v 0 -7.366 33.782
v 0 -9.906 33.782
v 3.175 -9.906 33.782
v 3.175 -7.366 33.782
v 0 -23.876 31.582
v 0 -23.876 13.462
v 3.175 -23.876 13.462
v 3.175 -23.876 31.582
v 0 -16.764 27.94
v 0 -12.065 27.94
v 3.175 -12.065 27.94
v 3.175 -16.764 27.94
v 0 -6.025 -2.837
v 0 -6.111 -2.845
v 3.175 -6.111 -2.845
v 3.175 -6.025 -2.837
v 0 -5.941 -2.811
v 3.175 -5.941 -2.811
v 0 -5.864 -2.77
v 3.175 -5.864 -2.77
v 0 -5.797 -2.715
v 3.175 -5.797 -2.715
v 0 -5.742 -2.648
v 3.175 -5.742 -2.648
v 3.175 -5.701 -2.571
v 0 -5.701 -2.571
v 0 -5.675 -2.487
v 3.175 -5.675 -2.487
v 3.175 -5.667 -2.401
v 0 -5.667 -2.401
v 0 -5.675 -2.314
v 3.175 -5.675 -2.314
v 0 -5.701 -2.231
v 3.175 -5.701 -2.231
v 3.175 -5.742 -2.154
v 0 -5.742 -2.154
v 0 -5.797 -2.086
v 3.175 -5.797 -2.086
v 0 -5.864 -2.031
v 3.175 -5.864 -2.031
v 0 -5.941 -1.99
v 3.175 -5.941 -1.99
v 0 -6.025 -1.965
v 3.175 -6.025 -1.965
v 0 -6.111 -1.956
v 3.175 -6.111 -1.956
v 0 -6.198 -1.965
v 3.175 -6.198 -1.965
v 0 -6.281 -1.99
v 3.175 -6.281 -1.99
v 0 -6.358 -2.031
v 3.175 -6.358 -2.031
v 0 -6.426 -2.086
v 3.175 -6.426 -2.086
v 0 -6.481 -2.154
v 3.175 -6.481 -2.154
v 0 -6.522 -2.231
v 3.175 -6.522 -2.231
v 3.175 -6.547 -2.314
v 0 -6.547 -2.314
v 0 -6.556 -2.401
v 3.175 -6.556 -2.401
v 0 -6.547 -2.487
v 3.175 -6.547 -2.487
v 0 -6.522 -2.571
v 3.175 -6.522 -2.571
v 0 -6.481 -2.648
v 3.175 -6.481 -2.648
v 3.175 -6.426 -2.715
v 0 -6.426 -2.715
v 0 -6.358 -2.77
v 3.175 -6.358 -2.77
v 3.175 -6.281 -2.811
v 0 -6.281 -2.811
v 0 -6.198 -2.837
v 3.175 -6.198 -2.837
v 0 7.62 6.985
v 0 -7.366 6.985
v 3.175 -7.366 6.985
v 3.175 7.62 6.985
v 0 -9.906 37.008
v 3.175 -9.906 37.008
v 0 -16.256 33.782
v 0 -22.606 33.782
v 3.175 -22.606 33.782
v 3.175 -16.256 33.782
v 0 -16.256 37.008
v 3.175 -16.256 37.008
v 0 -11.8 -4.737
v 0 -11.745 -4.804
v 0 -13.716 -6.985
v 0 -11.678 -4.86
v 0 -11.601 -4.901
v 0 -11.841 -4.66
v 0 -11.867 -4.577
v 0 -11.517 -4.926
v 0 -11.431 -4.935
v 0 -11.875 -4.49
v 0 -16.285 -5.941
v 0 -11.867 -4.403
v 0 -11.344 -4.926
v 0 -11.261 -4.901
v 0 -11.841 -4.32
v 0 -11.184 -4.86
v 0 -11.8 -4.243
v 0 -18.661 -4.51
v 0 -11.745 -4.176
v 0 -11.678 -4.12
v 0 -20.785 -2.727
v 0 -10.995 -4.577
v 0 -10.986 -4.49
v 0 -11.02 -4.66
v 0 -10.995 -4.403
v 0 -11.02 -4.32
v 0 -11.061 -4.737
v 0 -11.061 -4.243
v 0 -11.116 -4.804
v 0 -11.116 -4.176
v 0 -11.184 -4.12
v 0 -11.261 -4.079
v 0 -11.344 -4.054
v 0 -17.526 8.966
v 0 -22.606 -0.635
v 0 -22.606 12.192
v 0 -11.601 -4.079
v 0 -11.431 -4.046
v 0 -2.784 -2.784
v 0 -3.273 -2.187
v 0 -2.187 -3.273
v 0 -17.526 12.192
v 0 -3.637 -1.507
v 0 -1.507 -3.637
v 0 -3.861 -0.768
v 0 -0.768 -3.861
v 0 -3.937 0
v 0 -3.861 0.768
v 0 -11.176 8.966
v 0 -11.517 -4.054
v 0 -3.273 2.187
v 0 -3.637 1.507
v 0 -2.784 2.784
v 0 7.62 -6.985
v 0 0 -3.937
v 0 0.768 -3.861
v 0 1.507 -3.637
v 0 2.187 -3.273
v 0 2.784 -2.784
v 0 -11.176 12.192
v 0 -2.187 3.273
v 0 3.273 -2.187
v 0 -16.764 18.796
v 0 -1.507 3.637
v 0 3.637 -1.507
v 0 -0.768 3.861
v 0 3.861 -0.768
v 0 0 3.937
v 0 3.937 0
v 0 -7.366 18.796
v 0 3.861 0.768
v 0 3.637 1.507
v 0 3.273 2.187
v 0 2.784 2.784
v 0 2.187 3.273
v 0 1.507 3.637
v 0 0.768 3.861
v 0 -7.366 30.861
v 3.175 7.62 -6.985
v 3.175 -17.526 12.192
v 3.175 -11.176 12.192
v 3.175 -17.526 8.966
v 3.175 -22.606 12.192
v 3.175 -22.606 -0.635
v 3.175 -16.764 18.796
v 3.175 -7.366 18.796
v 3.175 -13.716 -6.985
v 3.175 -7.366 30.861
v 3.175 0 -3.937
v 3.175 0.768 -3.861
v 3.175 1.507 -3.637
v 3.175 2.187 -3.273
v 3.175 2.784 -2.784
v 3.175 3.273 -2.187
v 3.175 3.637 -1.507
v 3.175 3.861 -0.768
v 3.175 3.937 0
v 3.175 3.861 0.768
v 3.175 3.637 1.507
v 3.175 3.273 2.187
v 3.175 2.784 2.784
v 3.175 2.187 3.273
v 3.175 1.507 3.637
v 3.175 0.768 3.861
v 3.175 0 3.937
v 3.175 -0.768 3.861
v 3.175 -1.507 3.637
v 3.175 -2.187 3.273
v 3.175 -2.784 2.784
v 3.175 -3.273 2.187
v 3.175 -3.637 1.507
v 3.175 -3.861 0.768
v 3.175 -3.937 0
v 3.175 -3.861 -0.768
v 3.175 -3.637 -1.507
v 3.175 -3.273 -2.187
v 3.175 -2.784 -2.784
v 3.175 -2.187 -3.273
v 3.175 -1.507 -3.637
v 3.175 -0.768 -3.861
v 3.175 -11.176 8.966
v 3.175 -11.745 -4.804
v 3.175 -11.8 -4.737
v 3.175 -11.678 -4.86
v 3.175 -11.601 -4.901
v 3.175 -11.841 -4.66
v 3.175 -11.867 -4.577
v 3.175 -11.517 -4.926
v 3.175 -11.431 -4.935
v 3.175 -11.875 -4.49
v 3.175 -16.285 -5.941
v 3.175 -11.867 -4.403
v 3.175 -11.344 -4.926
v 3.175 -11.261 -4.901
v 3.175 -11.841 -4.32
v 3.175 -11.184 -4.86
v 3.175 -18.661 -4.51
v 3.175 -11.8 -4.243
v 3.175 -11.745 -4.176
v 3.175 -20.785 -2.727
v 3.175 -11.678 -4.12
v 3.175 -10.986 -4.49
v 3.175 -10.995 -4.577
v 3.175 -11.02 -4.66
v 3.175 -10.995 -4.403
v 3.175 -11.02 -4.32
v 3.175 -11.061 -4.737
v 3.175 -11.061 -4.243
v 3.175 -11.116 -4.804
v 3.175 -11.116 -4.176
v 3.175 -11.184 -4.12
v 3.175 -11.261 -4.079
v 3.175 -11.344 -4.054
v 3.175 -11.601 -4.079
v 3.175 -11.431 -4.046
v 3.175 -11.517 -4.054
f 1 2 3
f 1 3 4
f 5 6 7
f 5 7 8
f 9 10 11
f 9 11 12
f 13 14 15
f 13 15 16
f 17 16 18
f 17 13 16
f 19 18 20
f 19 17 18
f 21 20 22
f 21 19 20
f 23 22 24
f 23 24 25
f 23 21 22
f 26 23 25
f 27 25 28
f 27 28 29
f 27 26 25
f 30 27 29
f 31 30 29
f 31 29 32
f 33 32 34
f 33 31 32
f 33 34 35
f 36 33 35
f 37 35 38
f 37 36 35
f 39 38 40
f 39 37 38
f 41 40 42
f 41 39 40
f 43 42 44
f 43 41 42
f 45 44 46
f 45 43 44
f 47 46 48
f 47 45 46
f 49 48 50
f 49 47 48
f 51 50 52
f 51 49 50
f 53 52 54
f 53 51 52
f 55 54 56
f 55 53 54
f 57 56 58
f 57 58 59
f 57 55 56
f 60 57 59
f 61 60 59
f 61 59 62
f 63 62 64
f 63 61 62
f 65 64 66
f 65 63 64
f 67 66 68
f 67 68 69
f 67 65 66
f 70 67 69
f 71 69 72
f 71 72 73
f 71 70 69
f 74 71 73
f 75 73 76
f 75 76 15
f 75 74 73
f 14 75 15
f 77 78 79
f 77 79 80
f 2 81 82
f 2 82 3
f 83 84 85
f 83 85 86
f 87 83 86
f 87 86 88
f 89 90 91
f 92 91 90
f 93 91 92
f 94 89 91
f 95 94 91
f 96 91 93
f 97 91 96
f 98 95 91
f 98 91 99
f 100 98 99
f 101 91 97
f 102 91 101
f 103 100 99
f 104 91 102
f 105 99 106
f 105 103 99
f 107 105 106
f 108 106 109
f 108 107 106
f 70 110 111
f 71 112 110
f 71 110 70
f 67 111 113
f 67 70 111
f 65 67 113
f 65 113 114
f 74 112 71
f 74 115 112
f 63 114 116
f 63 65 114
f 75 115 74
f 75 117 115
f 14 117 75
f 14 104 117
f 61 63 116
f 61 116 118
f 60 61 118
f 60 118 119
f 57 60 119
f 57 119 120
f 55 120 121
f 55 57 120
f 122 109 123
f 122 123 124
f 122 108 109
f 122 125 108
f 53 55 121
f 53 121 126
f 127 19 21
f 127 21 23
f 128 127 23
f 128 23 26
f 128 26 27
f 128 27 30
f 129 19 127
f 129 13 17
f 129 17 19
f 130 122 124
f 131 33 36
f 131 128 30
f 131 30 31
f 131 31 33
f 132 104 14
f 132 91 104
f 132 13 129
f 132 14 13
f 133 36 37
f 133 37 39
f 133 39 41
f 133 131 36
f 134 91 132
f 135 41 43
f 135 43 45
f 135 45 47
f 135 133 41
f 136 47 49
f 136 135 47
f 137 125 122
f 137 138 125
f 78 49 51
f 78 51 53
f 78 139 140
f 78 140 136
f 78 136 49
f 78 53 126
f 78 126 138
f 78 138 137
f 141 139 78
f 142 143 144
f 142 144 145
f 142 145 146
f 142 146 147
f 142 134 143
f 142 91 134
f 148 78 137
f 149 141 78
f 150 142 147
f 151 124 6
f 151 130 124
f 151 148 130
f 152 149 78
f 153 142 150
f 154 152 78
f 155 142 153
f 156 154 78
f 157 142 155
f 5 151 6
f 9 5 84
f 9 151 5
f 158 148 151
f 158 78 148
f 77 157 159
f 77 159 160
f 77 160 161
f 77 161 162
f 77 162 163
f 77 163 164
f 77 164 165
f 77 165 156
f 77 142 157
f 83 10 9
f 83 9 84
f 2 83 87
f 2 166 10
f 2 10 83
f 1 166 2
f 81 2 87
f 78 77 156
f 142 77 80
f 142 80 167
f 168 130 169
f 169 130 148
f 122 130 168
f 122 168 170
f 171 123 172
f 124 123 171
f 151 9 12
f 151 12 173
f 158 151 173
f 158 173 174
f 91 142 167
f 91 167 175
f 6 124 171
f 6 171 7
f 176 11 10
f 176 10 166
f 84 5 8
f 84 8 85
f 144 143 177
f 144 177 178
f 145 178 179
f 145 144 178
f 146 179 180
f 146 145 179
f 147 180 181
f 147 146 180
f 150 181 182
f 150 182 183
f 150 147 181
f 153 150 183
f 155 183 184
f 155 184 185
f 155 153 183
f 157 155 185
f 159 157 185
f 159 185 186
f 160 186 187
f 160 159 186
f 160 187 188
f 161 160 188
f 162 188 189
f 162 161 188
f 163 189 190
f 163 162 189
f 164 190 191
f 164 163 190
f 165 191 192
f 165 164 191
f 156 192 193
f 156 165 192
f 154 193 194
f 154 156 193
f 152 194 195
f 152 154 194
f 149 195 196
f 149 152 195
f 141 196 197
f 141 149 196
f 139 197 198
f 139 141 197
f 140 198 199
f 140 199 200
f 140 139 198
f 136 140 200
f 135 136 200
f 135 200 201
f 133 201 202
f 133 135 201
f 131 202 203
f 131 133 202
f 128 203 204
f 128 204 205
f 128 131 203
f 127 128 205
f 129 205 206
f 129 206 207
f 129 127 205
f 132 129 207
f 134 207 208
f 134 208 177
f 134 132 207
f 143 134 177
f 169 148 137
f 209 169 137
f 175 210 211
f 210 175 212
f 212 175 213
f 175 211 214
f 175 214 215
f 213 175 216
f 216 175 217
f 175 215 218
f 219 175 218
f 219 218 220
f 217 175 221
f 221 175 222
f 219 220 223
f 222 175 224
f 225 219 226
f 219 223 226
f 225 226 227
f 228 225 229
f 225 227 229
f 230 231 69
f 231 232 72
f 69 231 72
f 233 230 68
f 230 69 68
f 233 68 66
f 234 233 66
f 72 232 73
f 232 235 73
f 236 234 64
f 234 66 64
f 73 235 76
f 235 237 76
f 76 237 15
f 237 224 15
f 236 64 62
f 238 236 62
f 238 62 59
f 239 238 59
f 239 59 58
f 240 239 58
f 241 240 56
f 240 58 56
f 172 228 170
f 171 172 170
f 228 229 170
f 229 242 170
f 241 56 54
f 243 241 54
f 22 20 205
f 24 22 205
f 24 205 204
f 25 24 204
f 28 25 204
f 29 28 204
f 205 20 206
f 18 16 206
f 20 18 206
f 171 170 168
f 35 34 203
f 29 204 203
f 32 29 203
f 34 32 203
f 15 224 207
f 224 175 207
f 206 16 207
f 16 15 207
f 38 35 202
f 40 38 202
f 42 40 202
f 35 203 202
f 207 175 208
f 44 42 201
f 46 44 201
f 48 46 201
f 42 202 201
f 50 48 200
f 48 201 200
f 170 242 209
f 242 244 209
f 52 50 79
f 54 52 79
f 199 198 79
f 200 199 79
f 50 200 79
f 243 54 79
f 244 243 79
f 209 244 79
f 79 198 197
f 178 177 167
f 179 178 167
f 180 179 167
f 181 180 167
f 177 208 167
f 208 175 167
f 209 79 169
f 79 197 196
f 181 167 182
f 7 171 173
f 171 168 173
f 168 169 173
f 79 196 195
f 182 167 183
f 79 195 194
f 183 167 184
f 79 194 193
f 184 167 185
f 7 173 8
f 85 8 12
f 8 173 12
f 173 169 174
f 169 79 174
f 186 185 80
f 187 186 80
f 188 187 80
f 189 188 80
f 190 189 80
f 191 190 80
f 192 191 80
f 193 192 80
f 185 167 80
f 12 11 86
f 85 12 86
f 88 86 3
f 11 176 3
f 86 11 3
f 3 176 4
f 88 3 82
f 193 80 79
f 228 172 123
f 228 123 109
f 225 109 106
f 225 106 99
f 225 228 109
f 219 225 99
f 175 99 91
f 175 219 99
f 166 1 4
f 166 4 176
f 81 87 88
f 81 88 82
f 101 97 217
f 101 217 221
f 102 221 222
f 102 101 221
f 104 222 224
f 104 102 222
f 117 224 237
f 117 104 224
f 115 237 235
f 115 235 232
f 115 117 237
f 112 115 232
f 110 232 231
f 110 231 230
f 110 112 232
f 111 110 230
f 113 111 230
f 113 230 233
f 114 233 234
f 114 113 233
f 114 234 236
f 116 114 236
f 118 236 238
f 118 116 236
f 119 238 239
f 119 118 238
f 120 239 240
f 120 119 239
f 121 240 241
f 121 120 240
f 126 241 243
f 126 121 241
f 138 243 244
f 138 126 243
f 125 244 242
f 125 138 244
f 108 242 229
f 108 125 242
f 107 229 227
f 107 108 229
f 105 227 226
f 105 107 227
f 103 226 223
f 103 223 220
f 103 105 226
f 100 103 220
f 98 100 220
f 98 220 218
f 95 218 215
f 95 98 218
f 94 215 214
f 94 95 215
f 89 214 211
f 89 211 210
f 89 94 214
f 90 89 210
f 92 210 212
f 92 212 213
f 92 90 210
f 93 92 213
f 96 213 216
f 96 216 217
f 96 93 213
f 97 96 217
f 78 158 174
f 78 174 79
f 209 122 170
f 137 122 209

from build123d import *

# Parameters (mm, degrees)
SKETCH1_R           = 3.937
SKETCH1_R_2         = 0.4445
SKETCH1_W           = 3.2258
SKETCH1_H           = 6.35
BOSS_EXTRUDE1_DEPTH = 3.175
BOSS_EXTRUDE2_DEPTH = 3.175
CUT_EXTRUDE1_DEPTH  = 4.175


with BuildPart() as part:
    # Sketch1 → Boss-Extrude1 (new body)
    with BuildSketch(Plane(origin=(0, 0, 0), x_dir=(0, 0, -1), z_dir=(1, 0, 0))):
        Polygon((-6.985, 7.62), (6.985, 7.62), (6.985, -22.606), (-33.782, -22.606), (-33.782, -16.256), (-37.0078, -16.256), (-37.0078, -9.906), (-33.782, -9.906), (-33.782, -7.366), (-27.94, -7.366), (-27.94, -16.764), (-18.796, -16.764), (-18.796, -7.366), (-6.985, -7.366), align=None)
        Circle(SKETCH1_R, mode=Mode.SUBTRACT)
        with Locations((2.40063044, -6.111302341)):
            Circle(SKETCH1_R_2, mode=Mode.SUBTRACT)
        with Locations((4.490066454, -11.430652127)):
            Circle(SKETCH1_R_2, mode=Mode.SUBTRACT)
        with Locations((-10.5791, -14.351)):
            Rectangle(SKETCH1_W, SKETCH1_H, mode=Mode.SUBTRACT)
    extrude(amount=BOSS_EXTRUDE1_DEPTH)

    # Sketch2 → Boss-Extrude2 (add)
    with BuildSketch(Plane.ZY):
        Polygon((13.462, -23.876), (31.582295474, -23.876), (33.782, -22.606), (12.192, -22.606), align=None)
    extrude(amount=-BOSS_EXTRUDE2_DEPTH)

    # Sketch3 → Cut-Extrude1 (cut, through all)
    with BuildSketch(Plane(origin=(3.175, 0, 0), x_dir=(0, 0, -1), z_dir=(1, 0, 0))):
        Polygon((-30.861, -7.366), (-27.94, -7.366), (-27.94, -12.065), align=None)
        with BuildLine():
            Line((6.985, -13.716), (6.985, -22.606))
            Line((6.985, -22.606), (0.635, -22.606))
            ThreePointArc((0.635, -22.606), (4.50973023, -18.660807307), (6.985, -13.716))
        make_face()
    extrude(amount=-CUT_EXTRUDE1_DEPTH, mode=Mode.SUBTRACT)


solid = part.part
